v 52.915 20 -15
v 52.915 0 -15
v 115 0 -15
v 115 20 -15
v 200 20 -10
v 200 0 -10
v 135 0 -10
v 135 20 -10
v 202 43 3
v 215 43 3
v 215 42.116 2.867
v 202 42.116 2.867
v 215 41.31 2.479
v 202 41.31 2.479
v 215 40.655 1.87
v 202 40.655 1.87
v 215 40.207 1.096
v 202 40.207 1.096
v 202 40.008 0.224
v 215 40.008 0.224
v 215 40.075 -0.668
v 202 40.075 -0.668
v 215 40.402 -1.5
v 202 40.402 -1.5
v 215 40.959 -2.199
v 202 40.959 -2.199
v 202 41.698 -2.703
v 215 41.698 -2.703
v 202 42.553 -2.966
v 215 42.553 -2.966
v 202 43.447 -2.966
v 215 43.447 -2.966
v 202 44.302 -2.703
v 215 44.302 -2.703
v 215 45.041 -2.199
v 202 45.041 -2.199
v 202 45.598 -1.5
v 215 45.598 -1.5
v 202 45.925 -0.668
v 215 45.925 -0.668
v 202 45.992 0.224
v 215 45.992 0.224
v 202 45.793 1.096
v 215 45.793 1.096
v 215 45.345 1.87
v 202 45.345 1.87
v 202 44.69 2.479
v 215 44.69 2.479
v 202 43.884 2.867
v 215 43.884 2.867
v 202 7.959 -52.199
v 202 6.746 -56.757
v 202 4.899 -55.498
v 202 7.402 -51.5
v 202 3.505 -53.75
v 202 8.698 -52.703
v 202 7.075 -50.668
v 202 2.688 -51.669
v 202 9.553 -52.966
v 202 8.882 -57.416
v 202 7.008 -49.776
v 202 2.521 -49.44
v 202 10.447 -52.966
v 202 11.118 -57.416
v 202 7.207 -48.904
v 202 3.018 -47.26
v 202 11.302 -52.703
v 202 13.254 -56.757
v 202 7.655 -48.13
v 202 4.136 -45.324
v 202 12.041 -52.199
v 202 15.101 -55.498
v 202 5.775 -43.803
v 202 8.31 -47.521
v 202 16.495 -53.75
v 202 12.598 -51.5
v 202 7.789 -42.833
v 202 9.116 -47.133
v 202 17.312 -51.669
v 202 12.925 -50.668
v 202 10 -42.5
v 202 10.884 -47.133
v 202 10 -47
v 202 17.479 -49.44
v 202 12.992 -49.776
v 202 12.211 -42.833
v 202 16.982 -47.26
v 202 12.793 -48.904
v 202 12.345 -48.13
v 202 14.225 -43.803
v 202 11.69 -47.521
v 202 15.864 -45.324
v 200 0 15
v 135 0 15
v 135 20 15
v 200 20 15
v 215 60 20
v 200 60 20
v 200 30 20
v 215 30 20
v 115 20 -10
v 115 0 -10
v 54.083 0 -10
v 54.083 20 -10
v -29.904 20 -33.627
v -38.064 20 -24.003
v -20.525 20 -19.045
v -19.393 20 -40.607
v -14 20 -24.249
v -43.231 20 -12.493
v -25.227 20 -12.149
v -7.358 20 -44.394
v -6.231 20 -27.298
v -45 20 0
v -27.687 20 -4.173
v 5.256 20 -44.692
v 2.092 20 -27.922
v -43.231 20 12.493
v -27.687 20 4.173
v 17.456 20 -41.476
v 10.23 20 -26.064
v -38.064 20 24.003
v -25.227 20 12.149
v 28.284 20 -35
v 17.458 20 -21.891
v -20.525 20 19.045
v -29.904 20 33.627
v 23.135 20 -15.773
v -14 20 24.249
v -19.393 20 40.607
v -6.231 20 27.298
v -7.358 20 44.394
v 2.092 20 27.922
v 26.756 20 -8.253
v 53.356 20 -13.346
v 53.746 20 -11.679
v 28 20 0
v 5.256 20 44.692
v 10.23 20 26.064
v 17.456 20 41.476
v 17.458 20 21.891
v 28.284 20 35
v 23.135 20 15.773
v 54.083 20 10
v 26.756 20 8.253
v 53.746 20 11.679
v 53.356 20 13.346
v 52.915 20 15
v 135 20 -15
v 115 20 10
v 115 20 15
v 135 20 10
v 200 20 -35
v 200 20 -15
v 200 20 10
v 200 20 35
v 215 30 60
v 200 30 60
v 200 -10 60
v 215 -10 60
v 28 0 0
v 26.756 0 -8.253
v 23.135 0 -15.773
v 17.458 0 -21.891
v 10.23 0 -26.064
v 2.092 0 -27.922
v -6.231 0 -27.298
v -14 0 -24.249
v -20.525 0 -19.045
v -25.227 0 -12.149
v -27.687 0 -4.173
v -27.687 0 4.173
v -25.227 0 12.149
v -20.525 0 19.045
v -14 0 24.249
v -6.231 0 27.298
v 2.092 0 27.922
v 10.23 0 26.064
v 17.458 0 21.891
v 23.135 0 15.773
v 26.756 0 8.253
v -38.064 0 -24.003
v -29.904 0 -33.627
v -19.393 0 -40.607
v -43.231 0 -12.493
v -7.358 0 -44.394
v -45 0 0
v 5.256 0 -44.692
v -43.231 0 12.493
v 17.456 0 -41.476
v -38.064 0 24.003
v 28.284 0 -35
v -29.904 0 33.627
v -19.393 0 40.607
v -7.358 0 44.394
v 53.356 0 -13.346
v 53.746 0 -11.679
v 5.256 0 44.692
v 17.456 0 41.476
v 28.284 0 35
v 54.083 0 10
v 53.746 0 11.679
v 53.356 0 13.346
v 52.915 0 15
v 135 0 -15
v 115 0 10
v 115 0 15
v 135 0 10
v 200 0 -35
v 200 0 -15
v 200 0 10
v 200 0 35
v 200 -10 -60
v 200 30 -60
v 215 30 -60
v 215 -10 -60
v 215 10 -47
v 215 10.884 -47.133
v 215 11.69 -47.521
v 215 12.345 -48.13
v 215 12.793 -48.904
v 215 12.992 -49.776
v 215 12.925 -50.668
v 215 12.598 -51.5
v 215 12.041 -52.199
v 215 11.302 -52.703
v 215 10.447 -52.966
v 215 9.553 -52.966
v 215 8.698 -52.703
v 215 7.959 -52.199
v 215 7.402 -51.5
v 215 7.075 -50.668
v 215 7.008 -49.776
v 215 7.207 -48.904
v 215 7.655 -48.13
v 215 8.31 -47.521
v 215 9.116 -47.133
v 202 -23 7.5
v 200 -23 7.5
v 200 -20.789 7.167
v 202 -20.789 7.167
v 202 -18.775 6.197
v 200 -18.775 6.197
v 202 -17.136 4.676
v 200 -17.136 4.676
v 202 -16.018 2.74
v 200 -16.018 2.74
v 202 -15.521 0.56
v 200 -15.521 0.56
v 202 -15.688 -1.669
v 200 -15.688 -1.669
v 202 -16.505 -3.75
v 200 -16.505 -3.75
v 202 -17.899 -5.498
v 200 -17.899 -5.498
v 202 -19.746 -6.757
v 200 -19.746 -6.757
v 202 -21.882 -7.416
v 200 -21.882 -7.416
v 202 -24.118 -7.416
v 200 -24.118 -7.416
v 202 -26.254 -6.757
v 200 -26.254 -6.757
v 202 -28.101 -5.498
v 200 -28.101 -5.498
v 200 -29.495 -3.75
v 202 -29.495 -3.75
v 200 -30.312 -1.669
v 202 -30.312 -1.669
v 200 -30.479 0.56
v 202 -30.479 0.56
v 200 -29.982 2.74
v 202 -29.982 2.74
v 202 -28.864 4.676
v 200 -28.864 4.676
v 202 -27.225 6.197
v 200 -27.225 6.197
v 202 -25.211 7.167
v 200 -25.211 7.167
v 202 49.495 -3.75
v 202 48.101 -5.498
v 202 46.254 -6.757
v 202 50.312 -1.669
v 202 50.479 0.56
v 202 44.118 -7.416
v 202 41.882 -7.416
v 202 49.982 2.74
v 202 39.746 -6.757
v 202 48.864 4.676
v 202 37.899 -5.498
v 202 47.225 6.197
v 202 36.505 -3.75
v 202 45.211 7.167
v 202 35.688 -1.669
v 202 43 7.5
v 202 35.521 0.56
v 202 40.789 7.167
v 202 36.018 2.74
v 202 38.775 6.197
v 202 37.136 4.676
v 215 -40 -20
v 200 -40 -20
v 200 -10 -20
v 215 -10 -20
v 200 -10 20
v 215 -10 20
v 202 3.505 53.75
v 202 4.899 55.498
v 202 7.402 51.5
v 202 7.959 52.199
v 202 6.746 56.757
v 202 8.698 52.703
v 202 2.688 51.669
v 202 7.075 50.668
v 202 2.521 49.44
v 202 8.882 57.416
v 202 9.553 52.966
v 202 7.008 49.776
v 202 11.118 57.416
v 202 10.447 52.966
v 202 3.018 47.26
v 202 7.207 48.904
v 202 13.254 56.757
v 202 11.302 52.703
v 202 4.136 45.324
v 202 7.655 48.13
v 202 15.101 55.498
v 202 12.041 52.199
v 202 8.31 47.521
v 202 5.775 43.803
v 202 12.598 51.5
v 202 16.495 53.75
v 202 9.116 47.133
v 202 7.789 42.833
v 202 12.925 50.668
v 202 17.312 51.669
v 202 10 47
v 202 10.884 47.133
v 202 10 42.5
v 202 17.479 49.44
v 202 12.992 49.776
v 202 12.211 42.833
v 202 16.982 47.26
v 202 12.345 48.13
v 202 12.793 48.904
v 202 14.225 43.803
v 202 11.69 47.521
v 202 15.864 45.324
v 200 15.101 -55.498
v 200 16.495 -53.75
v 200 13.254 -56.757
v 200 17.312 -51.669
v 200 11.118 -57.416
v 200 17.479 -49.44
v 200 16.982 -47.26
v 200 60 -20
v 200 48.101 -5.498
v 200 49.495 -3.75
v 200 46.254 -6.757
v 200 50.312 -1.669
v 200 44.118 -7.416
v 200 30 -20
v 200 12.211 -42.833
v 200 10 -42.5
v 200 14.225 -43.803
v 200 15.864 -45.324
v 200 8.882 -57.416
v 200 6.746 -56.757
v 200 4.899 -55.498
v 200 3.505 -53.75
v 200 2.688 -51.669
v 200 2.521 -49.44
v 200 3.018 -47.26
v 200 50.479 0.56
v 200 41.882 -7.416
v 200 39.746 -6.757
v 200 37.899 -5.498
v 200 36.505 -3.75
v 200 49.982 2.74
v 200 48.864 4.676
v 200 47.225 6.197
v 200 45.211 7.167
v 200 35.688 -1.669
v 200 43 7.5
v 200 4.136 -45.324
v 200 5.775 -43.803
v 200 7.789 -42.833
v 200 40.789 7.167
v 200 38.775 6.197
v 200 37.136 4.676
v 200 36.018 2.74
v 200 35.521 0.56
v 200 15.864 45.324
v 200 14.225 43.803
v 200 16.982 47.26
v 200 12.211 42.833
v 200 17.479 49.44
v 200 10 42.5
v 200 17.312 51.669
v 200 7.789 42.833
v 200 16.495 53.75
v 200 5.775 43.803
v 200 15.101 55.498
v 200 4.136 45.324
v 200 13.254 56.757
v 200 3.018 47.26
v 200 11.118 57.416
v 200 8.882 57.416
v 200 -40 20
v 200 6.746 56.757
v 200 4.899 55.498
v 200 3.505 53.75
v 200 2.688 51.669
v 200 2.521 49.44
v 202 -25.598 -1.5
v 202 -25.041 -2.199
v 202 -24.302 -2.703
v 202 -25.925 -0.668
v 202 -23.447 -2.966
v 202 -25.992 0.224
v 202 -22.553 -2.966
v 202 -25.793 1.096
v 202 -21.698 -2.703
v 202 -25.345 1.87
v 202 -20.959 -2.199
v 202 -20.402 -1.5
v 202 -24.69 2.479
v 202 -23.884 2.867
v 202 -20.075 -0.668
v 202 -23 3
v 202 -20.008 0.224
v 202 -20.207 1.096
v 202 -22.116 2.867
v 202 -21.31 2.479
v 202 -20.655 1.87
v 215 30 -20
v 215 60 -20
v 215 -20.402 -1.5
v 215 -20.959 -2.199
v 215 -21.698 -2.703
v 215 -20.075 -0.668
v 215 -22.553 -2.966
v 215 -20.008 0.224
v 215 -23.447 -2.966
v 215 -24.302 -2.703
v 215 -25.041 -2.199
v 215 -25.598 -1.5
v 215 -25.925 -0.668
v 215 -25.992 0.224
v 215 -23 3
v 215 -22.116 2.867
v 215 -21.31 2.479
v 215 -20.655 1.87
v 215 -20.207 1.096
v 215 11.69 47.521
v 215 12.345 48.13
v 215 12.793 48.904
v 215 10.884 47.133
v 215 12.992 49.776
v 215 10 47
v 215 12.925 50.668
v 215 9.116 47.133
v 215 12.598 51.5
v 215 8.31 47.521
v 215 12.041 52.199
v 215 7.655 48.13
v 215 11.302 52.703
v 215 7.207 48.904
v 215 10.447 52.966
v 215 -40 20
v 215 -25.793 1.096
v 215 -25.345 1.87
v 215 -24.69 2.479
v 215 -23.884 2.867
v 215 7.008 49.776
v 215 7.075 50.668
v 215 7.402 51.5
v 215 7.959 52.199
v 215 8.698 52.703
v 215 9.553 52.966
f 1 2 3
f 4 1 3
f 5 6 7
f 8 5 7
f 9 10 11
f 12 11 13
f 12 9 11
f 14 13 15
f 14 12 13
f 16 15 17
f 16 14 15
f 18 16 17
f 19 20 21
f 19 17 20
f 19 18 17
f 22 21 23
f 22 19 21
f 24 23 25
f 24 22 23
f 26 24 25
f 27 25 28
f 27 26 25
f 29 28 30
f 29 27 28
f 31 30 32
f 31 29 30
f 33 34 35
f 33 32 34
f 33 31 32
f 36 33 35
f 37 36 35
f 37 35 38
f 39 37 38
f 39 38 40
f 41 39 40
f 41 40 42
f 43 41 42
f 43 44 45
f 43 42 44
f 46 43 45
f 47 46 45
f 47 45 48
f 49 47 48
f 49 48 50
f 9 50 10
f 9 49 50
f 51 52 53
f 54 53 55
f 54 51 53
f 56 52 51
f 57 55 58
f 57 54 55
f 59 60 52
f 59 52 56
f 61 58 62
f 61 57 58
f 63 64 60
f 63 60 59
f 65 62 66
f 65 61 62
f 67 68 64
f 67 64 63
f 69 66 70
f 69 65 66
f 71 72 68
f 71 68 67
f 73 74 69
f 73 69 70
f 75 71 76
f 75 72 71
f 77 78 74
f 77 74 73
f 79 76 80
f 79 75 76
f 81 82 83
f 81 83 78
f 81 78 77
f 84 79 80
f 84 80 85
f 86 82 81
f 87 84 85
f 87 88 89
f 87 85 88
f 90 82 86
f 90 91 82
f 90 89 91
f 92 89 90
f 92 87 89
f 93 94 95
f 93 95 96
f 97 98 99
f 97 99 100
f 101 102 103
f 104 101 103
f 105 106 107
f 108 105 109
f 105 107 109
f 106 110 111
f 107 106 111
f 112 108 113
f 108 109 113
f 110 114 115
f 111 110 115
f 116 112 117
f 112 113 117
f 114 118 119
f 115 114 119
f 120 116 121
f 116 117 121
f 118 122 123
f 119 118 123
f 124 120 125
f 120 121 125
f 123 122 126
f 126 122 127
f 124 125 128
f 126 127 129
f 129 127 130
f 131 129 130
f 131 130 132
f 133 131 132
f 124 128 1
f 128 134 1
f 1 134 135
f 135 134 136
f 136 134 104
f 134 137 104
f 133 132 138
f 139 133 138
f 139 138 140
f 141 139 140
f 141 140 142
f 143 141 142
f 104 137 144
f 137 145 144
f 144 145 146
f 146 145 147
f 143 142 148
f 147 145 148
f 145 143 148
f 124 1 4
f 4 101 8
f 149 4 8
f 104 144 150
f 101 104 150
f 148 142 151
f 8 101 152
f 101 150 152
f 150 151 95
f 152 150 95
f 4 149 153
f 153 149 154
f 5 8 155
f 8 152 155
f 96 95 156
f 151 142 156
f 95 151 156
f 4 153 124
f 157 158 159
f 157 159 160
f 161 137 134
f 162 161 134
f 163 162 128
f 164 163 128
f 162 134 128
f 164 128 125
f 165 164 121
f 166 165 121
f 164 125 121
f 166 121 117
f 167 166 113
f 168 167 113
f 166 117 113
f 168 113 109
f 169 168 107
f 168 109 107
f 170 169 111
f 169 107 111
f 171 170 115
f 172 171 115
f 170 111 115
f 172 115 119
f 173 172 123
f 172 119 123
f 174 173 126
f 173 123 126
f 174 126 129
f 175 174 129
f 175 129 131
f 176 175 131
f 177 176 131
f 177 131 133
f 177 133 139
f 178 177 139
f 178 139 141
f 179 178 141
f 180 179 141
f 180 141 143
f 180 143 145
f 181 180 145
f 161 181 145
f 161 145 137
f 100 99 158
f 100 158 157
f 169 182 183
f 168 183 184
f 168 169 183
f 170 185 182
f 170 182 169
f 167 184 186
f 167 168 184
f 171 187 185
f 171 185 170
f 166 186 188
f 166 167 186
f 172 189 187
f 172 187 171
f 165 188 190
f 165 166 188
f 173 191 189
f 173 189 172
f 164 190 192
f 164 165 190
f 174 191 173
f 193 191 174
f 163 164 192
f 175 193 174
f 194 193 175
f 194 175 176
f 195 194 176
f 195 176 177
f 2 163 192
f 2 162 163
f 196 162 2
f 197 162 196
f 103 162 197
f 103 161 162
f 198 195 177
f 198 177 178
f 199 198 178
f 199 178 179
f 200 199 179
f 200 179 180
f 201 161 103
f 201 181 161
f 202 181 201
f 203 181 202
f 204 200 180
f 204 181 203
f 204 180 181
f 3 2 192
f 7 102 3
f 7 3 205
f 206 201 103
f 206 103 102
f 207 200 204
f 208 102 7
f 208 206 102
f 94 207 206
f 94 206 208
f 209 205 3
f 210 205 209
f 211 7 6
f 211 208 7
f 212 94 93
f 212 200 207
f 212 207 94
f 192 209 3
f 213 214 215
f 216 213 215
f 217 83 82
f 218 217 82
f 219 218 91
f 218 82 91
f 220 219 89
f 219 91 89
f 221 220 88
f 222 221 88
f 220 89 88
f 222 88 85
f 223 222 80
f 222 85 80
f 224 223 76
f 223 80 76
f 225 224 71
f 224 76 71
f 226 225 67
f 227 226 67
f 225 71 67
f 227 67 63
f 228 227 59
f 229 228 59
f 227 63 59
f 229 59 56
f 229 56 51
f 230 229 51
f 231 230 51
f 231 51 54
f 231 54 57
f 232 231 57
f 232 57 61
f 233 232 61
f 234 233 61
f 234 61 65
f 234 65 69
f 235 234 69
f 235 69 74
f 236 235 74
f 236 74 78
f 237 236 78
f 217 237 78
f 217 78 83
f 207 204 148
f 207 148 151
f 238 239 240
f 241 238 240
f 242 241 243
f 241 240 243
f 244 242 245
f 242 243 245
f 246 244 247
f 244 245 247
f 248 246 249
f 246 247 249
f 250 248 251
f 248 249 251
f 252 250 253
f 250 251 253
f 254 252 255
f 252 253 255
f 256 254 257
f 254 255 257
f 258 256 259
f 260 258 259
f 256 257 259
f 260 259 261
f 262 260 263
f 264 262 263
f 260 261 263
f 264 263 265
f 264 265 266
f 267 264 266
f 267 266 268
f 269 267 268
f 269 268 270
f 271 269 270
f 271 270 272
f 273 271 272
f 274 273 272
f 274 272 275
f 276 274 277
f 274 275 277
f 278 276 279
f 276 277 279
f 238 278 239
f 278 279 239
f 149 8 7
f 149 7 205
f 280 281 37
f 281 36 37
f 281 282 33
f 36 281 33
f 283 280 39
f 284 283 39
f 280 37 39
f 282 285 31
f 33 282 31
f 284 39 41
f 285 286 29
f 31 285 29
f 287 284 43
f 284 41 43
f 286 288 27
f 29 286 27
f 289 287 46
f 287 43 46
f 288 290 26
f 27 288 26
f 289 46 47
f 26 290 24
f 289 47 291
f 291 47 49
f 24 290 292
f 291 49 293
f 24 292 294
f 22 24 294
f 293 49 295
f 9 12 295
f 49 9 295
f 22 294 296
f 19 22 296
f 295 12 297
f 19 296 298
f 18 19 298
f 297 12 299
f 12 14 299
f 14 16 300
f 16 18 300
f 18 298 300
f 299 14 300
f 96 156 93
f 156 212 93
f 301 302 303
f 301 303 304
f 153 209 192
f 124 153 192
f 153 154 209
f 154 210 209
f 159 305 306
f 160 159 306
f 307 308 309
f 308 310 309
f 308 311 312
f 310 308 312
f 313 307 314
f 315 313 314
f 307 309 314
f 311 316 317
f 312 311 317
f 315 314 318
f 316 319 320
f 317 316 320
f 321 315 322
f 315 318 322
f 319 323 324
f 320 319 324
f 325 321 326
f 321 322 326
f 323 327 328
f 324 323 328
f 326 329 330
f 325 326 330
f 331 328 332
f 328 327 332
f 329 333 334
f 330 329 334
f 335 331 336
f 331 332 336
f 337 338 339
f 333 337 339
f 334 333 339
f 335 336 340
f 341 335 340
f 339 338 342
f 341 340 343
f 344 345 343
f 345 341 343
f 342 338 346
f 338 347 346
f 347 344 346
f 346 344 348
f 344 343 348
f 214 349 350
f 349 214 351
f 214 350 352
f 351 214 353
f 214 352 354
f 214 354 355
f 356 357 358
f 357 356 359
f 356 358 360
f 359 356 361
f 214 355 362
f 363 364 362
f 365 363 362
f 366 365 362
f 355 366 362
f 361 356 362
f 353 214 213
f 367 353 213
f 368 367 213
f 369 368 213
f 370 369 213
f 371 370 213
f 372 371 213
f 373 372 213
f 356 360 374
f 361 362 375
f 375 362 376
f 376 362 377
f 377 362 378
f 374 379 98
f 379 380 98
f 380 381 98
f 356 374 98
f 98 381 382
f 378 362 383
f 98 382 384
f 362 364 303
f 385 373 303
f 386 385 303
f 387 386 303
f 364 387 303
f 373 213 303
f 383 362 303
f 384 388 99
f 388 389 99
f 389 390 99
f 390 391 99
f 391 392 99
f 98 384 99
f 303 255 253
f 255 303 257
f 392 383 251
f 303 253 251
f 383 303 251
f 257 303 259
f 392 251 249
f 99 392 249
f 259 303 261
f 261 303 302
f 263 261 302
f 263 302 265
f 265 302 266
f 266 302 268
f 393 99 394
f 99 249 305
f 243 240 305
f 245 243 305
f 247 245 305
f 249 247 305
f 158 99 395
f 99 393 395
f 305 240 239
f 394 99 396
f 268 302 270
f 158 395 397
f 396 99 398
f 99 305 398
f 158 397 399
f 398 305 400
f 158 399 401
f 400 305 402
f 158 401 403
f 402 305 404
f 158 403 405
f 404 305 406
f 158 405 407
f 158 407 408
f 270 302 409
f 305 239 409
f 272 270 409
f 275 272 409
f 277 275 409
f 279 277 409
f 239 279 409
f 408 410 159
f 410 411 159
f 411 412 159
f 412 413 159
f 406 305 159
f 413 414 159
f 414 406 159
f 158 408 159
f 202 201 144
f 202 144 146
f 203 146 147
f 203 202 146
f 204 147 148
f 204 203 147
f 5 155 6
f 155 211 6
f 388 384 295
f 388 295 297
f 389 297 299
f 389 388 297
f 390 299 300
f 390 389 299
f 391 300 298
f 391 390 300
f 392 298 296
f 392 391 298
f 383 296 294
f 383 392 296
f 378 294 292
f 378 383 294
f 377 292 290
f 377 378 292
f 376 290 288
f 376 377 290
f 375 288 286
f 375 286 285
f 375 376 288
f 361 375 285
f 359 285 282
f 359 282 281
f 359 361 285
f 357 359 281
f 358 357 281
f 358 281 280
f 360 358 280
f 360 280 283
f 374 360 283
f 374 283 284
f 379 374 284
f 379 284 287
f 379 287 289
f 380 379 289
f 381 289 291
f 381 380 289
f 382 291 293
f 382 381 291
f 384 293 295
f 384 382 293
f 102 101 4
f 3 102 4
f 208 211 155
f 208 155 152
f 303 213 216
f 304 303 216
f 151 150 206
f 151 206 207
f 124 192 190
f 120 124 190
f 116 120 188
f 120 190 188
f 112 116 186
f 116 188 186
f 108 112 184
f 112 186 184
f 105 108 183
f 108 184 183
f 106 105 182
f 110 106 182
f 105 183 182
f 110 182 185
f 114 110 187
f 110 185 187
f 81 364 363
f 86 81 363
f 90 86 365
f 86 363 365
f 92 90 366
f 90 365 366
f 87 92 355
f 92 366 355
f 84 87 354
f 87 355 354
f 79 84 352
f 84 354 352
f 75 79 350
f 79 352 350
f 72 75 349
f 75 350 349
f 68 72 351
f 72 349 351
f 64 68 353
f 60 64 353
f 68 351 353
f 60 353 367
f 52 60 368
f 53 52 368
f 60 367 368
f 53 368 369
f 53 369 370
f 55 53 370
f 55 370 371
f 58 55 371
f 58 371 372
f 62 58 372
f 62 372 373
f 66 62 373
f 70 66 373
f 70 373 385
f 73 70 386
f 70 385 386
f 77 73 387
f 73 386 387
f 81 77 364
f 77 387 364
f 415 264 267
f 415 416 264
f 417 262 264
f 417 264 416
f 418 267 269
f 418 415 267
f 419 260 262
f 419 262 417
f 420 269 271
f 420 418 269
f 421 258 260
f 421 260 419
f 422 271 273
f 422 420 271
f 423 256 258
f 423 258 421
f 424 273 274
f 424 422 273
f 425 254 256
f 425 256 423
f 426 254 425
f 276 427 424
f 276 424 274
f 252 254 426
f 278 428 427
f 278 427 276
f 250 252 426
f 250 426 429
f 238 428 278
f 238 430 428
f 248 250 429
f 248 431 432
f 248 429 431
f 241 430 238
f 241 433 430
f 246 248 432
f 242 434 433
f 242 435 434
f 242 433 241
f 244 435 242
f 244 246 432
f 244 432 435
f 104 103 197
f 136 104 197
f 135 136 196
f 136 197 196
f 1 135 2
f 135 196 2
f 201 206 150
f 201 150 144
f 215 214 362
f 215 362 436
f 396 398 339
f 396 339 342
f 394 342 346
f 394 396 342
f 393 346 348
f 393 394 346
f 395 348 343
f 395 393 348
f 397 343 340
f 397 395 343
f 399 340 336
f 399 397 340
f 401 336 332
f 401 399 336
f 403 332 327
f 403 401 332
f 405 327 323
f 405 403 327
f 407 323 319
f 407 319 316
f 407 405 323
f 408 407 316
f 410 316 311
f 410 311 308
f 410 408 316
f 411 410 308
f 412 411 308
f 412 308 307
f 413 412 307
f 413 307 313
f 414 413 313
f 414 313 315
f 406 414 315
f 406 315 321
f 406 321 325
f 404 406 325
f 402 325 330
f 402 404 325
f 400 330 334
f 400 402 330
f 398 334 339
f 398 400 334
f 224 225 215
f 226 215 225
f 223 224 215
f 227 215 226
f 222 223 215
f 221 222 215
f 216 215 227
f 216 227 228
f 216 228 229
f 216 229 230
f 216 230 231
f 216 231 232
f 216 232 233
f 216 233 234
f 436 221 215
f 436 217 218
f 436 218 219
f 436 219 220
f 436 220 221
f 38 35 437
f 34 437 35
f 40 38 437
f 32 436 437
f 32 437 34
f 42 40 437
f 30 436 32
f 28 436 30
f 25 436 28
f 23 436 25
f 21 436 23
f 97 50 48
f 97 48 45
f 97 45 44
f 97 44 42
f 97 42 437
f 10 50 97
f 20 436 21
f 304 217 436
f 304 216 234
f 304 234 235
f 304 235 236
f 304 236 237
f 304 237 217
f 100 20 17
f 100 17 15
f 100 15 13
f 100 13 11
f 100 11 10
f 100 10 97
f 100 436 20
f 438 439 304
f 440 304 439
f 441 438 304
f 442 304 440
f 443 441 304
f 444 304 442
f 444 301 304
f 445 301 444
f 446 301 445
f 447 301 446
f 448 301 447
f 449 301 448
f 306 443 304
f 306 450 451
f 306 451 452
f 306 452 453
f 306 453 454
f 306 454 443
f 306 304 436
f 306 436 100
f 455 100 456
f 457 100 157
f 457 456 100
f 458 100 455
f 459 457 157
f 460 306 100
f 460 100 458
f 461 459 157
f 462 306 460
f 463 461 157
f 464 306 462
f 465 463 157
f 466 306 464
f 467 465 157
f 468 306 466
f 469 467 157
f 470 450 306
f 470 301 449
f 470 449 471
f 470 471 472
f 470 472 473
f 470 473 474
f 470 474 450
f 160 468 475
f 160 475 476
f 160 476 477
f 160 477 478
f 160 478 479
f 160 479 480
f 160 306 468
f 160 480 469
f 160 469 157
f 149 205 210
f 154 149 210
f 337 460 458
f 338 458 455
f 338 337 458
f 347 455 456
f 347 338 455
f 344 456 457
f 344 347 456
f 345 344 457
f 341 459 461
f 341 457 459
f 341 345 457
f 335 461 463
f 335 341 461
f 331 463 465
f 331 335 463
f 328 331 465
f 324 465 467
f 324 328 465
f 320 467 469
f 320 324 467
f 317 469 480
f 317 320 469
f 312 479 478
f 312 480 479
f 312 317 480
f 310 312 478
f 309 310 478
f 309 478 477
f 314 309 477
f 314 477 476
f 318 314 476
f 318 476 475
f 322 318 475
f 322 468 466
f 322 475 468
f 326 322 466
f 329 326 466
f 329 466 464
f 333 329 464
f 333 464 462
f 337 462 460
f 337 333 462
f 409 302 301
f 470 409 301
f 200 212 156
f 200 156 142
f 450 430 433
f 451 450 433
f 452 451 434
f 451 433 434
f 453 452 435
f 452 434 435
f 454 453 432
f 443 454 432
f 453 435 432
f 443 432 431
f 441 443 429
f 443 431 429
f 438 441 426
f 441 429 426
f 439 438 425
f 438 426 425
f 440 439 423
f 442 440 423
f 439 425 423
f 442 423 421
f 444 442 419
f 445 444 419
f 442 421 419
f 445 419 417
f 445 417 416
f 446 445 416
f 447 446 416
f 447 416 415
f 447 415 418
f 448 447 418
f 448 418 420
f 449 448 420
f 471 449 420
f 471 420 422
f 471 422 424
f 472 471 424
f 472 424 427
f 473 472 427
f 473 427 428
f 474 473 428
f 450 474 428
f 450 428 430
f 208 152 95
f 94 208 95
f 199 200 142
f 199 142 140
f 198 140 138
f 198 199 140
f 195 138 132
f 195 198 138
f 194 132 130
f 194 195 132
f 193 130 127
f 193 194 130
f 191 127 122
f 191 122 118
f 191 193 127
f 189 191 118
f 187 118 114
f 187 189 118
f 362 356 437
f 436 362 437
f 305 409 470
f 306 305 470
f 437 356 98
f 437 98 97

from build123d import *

# Parameters (mm, degrees)
BOSS_EXTRUDE1_DEPTH = 20
SKETCH3_R           = 28
CUT_EXTRUDE2_DEPTH  = 21
SKETCH5_W           = 15
SKETCH5_H           = 120
BOSS_EXTRUDE3_DEPTH = 10
SKETCH6_W           = 15
SKETCH6_H           = 40
BOSS_EXTRUDE4_DEPTH = 30
SKETCH10_R          = 7.5
CUT_EXTRUDE8_DEPTH  = 2
SKETCH11_R          = 3
CUT_EXTRUDE9_DEPTH  = 14
SKETCH12_R          = 7.5
CUT_EXTRUDE10_DEPTH = 2
SKETCH13_R          = 3
CUT_EXTRUDE11_DEPTH = 14
SKETCH14_W          = 20
SKETCH14_H          = 5
BOSS_EXTRUDE5_DEPTH = 20


with BuildPart() as part:
    # Sketch1 → Boss-Extrude1 (new body)
    with BuildSketch(Plane(origin=(0, 0, 0), x_dir=(1, 0, 0), z_dir=(0, 1, 0))):
        with BuildLine():
            Line((-45, 0), (215, 0))
            Line((215, 0), (215, 60))
            Line((215, 60), (200, 60))
            Line((200, 60), (200, 35))
            Line((200, 35), (28.284271247, 35))
            ThreePointArc((28.284271247, 35), (-19.393398282, 40.606601718), (-45, 0))
        make_face()
        with BuildLine():
            Line((200, 15), (200, 10))
            Line((200, 10), (54.083269132, 10))
            ThreePointArc((54.083269132, 10), (53.557527969, 12.513640472), (52.915026221, 15))
            Line((52.915026221, 15), (200, 15))
        make_face(mode=Mode.SUBTRACT)
    boss_extrude1 = extrude(amount=BOSS_EXTRUDE1_DEPTH)

    # Mirror2: Boss-Extrude1 across plane
    add(boss_extrude1.mirror(Plane(origin=(-45, 20, 0), x_dir=(1, 0, 0), z_dir=(0, 0, -1))))

    # Sketch3 → Cut-Extrude2 (cut, through all)
    with BuildSketch(Plane(origin=(0, 20, 0), x_dir=(1, 0, 0), z_dir=(0, 1, 0))):
        Circle(SKETCH3_R)
    extrude(amount=-CUT_EXTRUDE2_DEPTH, mode=Mode.SUBTRACT)

    # Sketch5 → Boss-Extrude3 (add)
    with BuildSketch(Plane.XZ):
        with Locations((207.5, 0)):
            Rectangle(SKETCH5_W, SKETCH5_H)
    boss_extrude3 = extrude(amount=BOSS_EXTRUDE3_DEPTH)

    # Sketch6 → Boss-Extrude4 (add)
    with BuildSketch(Plane.XZ.offset(10)):
        with Locations((207.5, 0)):
            Rectangle(SKETCH6_W, SKETCH6_H)
    boss_extrude4 = extrude(amount=BOSS_EXTRUDE4_DEPTH)

    # Mirror5: Boss-Extrude3 across plane
    add(boss_extrude3.mirror(Plane(origin=(0, 10, 0), x_dir=(0, 0, 1), z_dir=(0, -1, 0))))

    # Mirror6: Boss-Extrude4 across plane
    add(boss_extrude4.mirror(Plane(origin=(0, 10, 0), x_dir=(0, 0, 1), z_dir=(0, -1, 0))))

    # Sketch10 → Cut-Extrude8 (cut)
    with BuildSketch(Plane.ZY.offset(-200)):
        with Locations((0, -23)):
            Circle(SKETCH10_R)
    cut_extrude8 = extrude(amount=-CUT_EXTRUDE8_DEPTH, mode=Mode.SUBTRACT)

    # Sketch11 → Cut-Extrude9 (cut, through all)
    with BuildSketch(Plane.ZY.offset(-202)):
        with Locations((0, -23)):
            Circle(SKETCH11_R)
    cut_extrude9 = extrude(amount=-CUT_EXTRUDE9_DEPTH, mode=Mode.SUBTRACT)

    # Sketch12 → Cut-Extrude10 (cut)
    with BuildSketch(Plane.ZY.offset(-200)):
        with Locations((-50, 10)):
            Circle(SKETCH12_R)
    cut_extrude10 = extrude(amount=-CUT_EXTRUDE10_DEPTH, mode=Mode.SUBTRACT)

    # Sketch13 → Cut-Extrude11 (cut, through all)
    with BuildSketch(Plane.ZY.offset(-202)):
        with Locations((-50, 10)):
            Circle(SKETCH13_R)
    cut_extrude11 = extrude(amount=-CUT_EXTRUDE11_DEPTH, mode=Mode.SUBTRACT)

    # Mirror7: Cut-Extrude10, Cut-Extrude11 across plane
    add(cut_extrude10.mirror(Plane.XY), mode=Mode.SUBTRACT)
    add(cut_extrude11.mirror(Plane.XY), mode=Mode.SUBTRACT)

    # Mirror8: Cut-Extrude8, Cut-Extrude9 across plane
    add(cut_extrude8.mirror(Plane(origin=(0, 10, 0), x_dir=(0, 0, 1), z_dir=(0, -1, 0))), mode=Mode.SUBTRACT)
    add(cut_extrude9.mirror(Plane(origin=(0, 10, 0), x_dir=(0, 0, 1), z_dir=(0, -1, 0))), mode=Mode.SUBTRACT)

    # Sketch14 → Boss-Extrude5 (add)
    with BuildSketch(Plane(origin=(0, 20, 0), x_dir=(1, 0, 0), z_dir=(0, 1, 0))):
        with Locations((125, 12.5)):
            Rectangle(SKETCH14_W, SKETCH14_H)
    boss_extrude5 = extrude(amount=-BOSS_EXTRUDE5_DEPTH)

    # Mirror9: Boss-Extrude5 across plane
    add(boss_extrude5.mirror(Plane.XY))


with BuildPart() as body_2:
    # Split1: the piece on the far side of the plane
    add(part.part)
    split(bisect_by=Plane(origin=(200, 0, 0), x_dir=(0, 0, -1), z_dir=(-1, 0, 0)), keep=Keep.BOTTOM)


with BuildPart() as part_1:
    add(part.part)

    # Split1
    split(bisect_by=Plane(origin=(200, 0, 0), x_dir=(0, 0, -1), z_dir=(-1, 0, 0)), keep=Keep.TOP)


solid = Compound([body_2.part, part_1.part])
